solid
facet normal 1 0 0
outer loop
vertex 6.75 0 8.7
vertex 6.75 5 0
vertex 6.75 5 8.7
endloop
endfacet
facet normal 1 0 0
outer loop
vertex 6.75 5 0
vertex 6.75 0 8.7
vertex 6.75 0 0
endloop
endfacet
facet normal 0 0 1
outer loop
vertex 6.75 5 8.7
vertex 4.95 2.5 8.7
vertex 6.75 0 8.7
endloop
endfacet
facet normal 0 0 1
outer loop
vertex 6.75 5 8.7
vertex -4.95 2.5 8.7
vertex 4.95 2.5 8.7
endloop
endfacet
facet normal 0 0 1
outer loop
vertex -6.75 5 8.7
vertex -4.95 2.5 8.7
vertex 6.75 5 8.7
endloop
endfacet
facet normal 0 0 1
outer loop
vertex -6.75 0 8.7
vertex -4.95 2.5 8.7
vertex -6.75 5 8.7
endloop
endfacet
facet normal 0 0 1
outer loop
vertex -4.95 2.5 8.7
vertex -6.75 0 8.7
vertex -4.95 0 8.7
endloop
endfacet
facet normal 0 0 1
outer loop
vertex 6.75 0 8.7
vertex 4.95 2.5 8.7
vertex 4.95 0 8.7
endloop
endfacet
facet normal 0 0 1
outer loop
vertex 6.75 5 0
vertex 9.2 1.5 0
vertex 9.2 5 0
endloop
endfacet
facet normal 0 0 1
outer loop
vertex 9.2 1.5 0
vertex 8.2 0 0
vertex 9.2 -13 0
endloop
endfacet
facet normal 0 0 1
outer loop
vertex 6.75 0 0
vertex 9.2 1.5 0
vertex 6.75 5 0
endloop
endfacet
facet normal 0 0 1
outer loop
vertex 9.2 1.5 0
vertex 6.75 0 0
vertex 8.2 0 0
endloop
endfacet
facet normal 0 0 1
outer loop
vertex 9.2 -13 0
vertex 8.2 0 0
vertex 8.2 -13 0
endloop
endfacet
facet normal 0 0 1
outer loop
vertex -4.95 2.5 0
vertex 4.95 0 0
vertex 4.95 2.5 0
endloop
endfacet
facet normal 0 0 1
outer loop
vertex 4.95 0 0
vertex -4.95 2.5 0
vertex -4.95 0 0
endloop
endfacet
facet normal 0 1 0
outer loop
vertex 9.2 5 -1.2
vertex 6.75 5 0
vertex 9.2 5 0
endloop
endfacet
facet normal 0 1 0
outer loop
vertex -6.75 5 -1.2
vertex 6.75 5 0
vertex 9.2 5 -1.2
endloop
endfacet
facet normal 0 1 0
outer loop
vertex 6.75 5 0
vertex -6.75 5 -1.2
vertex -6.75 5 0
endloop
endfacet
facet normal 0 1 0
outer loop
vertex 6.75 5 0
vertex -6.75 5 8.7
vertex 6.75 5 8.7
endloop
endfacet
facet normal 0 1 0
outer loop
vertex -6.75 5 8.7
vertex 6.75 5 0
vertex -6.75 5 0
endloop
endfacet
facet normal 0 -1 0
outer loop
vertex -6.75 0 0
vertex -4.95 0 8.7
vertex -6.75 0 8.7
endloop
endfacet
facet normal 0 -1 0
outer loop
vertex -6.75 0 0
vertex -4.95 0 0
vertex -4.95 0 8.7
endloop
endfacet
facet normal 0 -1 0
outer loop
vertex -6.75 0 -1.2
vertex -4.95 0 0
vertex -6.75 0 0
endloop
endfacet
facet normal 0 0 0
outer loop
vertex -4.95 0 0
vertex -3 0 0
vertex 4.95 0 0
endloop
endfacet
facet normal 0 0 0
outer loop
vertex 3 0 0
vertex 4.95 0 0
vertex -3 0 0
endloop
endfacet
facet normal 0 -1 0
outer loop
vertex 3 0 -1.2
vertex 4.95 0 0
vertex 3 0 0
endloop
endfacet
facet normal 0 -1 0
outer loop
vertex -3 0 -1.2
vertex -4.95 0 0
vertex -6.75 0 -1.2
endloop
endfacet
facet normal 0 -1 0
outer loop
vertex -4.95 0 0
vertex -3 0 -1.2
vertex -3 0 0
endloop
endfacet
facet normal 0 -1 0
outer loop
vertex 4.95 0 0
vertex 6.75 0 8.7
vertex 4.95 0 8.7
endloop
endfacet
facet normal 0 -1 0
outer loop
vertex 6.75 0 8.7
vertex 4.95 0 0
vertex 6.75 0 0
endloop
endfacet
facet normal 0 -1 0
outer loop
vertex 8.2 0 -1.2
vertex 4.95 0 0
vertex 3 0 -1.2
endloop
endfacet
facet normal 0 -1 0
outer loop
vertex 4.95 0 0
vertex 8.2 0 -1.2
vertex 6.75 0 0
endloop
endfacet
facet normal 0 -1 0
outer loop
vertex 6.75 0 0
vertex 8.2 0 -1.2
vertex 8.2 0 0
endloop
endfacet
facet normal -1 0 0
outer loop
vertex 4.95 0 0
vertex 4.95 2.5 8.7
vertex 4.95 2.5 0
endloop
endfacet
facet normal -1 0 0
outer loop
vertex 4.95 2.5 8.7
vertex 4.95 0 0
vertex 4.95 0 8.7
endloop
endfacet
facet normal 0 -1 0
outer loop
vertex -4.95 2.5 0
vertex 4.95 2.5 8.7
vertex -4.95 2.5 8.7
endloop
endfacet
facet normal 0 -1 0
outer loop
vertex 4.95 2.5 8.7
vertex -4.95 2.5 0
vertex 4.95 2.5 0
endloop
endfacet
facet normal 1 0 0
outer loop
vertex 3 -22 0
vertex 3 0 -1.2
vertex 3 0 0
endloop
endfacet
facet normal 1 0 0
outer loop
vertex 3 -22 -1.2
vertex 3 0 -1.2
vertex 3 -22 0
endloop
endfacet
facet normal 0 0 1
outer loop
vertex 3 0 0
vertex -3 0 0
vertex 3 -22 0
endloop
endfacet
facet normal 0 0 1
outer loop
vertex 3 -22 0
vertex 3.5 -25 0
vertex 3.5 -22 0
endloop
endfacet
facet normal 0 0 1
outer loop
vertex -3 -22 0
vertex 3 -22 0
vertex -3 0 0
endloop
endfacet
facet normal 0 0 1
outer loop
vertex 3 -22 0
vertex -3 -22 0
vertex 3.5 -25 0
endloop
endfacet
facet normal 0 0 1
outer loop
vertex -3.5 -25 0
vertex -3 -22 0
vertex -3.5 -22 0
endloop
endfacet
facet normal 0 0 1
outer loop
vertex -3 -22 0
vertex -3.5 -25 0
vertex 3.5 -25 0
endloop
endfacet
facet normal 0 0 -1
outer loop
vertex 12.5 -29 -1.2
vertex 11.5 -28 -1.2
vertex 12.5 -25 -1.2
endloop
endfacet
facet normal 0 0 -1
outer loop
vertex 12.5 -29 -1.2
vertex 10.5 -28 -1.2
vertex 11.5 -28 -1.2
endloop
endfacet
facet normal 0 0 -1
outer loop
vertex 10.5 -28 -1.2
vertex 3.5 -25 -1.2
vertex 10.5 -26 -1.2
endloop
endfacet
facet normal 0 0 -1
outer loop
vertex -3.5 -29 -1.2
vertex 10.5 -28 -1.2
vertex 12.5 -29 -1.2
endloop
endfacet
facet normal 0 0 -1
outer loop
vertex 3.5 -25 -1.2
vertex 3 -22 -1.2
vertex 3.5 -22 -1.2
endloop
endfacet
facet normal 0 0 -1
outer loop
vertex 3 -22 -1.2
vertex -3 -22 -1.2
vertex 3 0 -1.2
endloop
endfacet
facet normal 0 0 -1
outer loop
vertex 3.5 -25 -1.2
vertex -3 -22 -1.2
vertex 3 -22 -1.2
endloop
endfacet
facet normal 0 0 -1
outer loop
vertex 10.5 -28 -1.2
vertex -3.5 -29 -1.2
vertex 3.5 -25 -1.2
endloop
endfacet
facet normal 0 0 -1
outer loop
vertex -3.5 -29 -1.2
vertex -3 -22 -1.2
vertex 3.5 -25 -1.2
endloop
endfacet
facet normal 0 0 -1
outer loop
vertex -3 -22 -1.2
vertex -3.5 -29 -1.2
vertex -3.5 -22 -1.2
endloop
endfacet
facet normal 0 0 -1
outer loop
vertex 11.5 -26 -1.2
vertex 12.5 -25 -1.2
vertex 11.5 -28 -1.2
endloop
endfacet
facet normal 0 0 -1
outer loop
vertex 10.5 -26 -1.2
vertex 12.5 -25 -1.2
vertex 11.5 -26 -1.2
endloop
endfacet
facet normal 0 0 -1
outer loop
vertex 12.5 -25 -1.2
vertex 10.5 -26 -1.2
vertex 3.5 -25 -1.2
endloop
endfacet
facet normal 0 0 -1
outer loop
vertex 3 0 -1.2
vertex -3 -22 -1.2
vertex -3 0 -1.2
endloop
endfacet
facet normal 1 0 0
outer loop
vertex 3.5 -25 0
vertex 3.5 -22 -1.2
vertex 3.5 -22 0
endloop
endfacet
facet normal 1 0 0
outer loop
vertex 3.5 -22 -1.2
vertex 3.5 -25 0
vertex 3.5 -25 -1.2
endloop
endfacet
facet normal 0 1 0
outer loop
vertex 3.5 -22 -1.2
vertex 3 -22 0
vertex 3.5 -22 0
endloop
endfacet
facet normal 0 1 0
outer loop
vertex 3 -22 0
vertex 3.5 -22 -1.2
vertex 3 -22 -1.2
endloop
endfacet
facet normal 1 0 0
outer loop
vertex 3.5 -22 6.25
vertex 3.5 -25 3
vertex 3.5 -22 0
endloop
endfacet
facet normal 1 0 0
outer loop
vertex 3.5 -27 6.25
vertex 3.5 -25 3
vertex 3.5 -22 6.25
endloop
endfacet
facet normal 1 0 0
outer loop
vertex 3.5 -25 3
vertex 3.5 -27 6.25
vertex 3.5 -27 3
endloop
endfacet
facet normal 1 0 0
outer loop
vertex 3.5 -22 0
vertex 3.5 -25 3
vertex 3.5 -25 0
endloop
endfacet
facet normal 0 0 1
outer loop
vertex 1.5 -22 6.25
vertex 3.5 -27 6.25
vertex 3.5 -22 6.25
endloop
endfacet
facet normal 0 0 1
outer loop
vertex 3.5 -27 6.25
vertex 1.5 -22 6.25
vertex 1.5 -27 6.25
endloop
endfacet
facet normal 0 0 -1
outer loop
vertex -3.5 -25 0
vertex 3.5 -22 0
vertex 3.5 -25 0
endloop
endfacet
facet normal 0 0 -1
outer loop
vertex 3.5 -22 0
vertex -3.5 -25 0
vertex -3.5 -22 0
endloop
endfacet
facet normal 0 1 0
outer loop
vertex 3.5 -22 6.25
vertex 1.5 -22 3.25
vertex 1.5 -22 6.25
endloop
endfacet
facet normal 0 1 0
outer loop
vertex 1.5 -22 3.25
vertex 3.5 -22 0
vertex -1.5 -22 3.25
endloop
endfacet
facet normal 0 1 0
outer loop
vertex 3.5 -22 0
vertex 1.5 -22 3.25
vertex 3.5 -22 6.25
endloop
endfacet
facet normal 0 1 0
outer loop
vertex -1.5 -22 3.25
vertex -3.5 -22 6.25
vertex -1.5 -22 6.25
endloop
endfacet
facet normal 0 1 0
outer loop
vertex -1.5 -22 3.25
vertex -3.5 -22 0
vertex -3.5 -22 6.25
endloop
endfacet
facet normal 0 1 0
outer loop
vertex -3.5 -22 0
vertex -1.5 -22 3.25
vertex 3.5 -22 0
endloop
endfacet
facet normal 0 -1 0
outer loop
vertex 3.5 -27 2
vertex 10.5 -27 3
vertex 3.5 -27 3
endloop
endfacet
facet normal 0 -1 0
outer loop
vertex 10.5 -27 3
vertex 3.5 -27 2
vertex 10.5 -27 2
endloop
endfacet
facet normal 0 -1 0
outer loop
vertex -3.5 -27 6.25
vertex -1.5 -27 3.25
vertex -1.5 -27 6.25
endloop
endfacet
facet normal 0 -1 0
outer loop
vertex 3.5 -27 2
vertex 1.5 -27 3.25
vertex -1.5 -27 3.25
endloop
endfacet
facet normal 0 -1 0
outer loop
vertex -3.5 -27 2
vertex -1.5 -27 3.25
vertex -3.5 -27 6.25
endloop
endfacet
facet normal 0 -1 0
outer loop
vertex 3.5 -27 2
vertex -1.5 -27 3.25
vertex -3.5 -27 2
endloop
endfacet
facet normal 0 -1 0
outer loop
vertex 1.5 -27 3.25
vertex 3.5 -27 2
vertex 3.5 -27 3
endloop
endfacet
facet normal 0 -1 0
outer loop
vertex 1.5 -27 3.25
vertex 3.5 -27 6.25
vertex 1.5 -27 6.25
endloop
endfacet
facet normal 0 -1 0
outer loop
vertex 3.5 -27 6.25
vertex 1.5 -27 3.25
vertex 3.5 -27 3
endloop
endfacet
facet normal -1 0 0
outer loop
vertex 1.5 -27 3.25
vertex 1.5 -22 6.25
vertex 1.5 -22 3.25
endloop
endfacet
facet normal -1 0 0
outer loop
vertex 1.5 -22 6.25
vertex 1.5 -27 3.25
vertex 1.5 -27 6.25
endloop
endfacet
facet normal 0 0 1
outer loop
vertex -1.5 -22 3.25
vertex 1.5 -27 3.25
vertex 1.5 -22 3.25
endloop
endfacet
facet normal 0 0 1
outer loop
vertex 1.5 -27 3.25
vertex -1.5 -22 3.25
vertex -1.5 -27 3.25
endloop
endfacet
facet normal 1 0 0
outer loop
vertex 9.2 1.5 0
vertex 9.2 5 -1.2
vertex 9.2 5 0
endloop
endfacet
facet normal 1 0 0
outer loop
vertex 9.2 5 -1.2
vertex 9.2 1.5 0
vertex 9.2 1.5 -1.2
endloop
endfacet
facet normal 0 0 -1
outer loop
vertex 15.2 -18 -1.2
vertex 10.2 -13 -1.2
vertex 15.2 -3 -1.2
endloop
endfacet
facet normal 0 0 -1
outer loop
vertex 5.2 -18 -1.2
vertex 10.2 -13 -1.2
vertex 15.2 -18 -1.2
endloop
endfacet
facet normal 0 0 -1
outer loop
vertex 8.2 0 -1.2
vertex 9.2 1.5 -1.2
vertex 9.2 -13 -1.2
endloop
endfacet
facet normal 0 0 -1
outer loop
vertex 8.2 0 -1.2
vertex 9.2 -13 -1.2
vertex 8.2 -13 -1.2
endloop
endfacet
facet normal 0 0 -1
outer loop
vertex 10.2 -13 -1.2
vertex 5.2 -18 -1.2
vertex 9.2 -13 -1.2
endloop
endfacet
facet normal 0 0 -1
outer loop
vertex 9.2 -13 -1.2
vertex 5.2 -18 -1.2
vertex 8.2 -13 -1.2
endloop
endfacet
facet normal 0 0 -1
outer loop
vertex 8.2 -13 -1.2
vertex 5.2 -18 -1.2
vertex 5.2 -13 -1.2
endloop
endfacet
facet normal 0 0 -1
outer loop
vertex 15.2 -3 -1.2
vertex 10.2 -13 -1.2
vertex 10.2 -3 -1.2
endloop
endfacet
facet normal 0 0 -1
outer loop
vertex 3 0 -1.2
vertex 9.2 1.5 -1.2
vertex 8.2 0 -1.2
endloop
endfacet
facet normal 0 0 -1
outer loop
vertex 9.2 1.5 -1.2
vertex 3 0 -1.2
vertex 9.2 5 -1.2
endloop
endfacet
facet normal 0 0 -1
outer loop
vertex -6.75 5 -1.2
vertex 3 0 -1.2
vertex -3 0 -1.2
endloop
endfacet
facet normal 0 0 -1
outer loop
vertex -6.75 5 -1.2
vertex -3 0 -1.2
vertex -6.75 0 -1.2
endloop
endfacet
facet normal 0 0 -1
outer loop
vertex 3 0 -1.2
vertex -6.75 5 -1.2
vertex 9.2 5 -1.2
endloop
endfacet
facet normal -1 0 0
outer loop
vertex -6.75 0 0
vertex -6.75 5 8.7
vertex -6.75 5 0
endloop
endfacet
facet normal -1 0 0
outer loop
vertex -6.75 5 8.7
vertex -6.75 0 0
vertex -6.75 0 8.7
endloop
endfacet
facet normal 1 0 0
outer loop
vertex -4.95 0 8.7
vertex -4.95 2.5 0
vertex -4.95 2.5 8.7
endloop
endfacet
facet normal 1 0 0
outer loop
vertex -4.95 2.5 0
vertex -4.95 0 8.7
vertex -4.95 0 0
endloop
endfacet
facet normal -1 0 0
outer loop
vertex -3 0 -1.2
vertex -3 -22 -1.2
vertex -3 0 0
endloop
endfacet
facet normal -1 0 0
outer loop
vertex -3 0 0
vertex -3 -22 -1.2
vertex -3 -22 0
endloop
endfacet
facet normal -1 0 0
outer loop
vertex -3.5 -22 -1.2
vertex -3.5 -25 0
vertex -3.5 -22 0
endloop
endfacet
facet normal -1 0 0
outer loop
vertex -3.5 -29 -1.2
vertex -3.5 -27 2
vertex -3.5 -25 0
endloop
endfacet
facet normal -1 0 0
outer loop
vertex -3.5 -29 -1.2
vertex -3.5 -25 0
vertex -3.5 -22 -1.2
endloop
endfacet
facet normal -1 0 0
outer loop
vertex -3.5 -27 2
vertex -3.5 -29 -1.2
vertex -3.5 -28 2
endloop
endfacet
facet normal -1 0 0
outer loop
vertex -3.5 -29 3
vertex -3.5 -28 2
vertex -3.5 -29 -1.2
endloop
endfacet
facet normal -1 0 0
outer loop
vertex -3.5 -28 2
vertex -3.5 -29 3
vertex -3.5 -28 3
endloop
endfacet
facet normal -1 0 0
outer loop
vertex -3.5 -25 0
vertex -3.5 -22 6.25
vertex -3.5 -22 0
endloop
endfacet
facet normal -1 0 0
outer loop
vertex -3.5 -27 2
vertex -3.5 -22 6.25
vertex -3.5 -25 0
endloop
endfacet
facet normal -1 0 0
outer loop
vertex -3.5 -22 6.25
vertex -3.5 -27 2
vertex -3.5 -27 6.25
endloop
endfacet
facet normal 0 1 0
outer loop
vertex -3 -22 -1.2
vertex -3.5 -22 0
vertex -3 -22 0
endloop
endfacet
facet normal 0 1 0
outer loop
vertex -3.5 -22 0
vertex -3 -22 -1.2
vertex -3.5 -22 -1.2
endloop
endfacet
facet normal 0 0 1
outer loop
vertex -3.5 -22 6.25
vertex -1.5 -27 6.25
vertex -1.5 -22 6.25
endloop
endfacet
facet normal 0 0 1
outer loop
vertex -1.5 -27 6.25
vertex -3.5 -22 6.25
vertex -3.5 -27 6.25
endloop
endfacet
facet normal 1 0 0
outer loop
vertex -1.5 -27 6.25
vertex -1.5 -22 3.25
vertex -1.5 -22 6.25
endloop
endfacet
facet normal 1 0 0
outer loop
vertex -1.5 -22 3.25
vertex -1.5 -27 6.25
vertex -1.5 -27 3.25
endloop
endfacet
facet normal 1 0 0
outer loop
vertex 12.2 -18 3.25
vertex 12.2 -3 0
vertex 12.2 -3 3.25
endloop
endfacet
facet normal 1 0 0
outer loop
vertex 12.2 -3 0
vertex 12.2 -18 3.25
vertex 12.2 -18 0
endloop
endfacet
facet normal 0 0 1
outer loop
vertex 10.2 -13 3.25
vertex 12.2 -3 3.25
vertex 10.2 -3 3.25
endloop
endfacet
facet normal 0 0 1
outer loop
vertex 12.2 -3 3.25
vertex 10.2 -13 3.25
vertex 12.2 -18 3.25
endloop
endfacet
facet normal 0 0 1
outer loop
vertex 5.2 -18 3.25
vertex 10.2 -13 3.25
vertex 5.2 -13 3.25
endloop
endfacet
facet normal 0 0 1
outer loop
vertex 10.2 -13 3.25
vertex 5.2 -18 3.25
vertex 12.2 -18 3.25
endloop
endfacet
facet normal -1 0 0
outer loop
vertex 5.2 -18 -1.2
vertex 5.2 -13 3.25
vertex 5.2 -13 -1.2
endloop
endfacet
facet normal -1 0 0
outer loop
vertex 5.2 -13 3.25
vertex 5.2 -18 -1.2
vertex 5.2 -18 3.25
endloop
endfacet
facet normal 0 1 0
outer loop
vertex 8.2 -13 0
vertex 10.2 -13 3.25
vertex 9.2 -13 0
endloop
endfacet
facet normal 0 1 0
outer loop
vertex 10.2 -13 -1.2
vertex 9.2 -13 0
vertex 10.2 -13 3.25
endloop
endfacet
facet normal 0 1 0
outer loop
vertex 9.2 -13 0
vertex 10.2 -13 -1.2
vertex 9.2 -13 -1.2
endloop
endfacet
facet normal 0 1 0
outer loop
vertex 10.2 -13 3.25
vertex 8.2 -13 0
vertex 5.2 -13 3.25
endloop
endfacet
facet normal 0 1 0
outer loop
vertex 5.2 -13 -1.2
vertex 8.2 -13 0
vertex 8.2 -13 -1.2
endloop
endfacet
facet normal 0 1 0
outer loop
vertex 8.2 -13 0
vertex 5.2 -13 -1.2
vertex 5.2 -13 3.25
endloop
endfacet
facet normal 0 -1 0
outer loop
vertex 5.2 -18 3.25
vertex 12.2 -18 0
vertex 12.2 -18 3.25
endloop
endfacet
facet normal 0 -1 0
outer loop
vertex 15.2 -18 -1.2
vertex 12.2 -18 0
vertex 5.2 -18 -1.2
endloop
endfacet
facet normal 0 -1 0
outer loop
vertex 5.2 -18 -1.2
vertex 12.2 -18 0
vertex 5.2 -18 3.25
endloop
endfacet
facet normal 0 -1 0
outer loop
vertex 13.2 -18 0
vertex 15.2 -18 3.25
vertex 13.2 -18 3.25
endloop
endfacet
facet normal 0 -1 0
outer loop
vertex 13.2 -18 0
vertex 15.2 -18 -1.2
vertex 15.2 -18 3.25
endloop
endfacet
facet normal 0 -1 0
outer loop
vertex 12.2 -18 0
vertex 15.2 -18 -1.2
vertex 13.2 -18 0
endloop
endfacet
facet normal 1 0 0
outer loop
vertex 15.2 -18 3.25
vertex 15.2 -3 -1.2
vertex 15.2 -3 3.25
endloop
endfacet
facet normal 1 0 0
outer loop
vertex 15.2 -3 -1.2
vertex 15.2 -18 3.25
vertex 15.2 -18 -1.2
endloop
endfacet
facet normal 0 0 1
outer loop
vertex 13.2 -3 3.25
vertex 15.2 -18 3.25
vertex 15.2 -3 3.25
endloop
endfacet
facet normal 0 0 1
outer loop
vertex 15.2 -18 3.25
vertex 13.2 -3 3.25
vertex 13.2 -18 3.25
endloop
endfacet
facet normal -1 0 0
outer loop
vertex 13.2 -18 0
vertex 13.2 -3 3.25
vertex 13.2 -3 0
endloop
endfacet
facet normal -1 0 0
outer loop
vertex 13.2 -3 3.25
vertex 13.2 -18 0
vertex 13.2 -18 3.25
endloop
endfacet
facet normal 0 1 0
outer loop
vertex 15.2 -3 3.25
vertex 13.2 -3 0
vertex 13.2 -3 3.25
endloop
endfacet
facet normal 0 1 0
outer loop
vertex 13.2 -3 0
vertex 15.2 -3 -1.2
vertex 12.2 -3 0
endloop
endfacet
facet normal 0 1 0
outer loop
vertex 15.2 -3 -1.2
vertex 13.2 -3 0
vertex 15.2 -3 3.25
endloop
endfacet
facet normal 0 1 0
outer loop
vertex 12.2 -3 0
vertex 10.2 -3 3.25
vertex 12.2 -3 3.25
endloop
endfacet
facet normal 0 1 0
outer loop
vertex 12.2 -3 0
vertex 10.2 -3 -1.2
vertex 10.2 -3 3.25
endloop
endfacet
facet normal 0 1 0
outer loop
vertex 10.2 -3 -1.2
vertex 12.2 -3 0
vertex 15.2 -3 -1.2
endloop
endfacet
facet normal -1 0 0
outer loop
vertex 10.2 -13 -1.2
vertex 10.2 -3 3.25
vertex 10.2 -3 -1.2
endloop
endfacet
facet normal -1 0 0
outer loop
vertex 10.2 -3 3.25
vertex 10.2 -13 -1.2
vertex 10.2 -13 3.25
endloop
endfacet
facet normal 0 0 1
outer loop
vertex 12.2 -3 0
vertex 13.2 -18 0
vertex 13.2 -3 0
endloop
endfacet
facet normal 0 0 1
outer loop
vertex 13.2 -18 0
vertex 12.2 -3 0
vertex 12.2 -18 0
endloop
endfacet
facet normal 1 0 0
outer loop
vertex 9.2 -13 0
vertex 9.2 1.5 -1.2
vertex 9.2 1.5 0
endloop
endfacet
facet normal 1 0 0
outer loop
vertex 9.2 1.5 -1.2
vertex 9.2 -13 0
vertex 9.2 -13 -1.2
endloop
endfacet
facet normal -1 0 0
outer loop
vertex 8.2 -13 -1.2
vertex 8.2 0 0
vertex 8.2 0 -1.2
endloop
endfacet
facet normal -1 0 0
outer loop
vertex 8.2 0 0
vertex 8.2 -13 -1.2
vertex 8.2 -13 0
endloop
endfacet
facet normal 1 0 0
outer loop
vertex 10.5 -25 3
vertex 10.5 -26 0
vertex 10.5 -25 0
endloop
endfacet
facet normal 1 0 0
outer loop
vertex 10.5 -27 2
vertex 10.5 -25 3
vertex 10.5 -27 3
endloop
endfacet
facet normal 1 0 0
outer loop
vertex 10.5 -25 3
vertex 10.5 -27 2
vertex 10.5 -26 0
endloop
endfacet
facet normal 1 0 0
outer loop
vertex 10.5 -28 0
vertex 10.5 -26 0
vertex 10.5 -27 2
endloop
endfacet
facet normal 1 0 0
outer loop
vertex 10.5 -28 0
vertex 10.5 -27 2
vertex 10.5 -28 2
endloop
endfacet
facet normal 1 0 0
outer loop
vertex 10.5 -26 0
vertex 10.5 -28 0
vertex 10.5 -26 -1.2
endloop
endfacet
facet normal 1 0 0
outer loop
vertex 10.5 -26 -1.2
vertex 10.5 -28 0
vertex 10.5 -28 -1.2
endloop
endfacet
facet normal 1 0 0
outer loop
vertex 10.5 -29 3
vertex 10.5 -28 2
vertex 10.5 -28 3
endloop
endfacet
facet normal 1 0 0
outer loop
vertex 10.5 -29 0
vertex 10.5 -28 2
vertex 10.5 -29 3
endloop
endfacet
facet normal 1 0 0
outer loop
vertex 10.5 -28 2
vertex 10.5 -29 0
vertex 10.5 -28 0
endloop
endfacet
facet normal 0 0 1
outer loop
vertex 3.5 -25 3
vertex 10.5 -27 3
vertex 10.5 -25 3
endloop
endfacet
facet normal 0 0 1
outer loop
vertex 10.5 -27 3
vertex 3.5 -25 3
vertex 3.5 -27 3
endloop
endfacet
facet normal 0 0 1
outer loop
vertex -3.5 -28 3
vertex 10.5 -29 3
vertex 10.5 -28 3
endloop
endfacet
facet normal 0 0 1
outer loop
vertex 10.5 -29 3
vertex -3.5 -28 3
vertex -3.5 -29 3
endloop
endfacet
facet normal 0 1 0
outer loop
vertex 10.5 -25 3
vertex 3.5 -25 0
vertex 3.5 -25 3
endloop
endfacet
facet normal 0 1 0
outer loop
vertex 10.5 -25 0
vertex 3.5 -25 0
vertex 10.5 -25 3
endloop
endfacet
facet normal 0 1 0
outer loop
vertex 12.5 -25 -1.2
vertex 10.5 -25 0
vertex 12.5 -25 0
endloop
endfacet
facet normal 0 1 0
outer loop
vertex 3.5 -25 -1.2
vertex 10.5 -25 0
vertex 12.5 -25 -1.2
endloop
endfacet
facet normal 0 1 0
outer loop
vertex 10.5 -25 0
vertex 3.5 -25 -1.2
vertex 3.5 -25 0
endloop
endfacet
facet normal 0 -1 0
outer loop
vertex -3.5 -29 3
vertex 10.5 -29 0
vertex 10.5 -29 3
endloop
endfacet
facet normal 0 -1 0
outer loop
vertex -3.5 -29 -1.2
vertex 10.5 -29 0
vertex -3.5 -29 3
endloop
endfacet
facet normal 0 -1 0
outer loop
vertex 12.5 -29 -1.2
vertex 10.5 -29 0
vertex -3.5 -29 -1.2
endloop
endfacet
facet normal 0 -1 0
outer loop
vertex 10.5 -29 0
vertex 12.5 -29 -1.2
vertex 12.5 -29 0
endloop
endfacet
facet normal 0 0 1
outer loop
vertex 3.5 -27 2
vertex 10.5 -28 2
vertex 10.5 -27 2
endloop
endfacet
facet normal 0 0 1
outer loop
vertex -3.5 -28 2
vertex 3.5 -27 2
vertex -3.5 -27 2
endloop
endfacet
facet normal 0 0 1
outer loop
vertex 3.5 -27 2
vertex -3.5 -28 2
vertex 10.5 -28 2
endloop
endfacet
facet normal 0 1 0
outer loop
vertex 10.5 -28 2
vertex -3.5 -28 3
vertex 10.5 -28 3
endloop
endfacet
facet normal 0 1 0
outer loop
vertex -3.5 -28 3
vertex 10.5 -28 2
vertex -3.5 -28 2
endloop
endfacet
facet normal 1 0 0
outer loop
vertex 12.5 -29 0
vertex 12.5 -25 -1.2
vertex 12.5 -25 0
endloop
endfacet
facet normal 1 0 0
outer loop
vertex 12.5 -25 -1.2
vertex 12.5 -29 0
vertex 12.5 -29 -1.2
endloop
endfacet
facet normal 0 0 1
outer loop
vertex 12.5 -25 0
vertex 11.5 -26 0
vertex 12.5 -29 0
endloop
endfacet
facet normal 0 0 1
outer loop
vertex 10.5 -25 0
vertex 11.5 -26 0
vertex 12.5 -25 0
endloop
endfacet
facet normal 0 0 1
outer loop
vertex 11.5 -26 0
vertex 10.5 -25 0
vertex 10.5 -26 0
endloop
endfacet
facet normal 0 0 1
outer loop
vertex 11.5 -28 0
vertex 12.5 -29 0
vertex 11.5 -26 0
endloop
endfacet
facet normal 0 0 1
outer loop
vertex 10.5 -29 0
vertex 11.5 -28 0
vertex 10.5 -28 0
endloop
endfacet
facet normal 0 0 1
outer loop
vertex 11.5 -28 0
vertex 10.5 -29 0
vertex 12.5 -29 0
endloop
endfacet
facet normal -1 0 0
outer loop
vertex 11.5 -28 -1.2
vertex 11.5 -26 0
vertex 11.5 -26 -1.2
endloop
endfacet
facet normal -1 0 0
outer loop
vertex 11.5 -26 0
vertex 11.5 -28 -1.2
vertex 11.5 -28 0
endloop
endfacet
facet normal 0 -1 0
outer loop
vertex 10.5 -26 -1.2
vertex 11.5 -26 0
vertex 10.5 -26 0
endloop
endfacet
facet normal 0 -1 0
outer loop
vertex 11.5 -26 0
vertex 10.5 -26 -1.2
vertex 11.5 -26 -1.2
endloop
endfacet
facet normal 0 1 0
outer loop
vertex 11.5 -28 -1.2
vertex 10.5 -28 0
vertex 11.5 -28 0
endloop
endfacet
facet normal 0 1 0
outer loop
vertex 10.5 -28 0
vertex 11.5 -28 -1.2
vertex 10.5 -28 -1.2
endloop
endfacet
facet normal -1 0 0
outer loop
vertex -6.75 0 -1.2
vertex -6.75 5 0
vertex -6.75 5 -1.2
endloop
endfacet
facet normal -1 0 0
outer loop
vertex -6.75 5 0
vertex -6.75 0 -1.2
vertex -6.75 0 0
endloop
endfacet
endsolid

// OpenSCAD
/* Pole holder centered on the holder */
module poleHolder(radius,headradius,pivotlength)
{
  translate(v=[-radius-2,-2.5,0])
  {
    difference()
    {
      translate(v=[0,0,-1.2])
        cube(size=[2*radius+4,5,headradius+radius+1.2]);
      translate(v=[2,0,headradius-radius])
        cube(size=[2*radius,5,2*radius]);
    }
  }

  translate(v=[-0.5,0,-1.2])
    cube(size=[1.0,pivotlength,0.8]);
}

/* Pole holder centered on the holder */
module poleHolderNoUpright(radius,headradius,pivotlength)
{
  translate(v=[-radius,-2.5,0])
  {
    translate(v=[-2,0,-1.2])
      cube(size=[2*radius+4,5,headradius-radius+1.2]);
    translate(v=[2*radius+3,0,-1.2])
      cube(size=[2,15,headradius-radius+1.2]);
    translate(v=[2*radius,0,-1.2])
      cube(size=[2,15,headradius-radius+1.2]);
    translate(v=[2*radius+2,0,-1.2])
      cube(size=[1,15,1.2]);
  }

  translate(v=[-0.5,0,-1.2])
    cube(size=[1.0,pivotlength,1.2]);
}

module halfRelay(radius,headradius)
{
  /* Half a nail head holder */
  difference()
  {
    cube(size=[headradius+2,5,2*headradius-0.8]);

    cube(size=[headradius+0.2,2.5,2*headradius-0.8]);
  }

  translate(v=[0,0,-1.2])
    cube(size=[headradius+4.45,5,1.2]);

  translate(v=[0,-27,-1.2])
  {
    cube(size=[3,27,1.2]);

    cube(size=[3.5,5,1.2]);
  }

  /* Half a nail stem holder */
  translate(v=[0,-27,0])
    difference()
    {
      cube(size=[radius+2,5,headradius+radius]);
      translate(v=[0,0,headradius-radius])
        cube(size=[radius,5,2*radius]);
    }

}

module poleHolder(radius,headradius)
{
  translate(v=[8.7,-15.5,0])
    rotate([0,0,-0.0])
      poleHolderNoUpright(radius,headradius,17);
}

difference()
{
  union()
  {
    halfRelay(1.5,4.75);
    mirror([1,0,0])
      halfRelay(1.5,4.75);

    poleHolder(1.5,4.75);

    translate(v=[-3.5,-29,-1.2])
    {
      difference()
      {
        cube(size=[14,4,3+1.2]);

        translate(v=[0,1,3.2])
          cube(size=[14,1,1.0]);
      }

      translate(v=[14,0,0])
        difference()
        {
          cube(size=[2,4,1.2]);

          translate(v=[0,1,0])
            cube(size=[1,2,1.2]);
        }
    }
  }

  translate(v=[-4.75-6.5,0,-1.2])
    cube(size=[4.5,5,1.2]);

}
